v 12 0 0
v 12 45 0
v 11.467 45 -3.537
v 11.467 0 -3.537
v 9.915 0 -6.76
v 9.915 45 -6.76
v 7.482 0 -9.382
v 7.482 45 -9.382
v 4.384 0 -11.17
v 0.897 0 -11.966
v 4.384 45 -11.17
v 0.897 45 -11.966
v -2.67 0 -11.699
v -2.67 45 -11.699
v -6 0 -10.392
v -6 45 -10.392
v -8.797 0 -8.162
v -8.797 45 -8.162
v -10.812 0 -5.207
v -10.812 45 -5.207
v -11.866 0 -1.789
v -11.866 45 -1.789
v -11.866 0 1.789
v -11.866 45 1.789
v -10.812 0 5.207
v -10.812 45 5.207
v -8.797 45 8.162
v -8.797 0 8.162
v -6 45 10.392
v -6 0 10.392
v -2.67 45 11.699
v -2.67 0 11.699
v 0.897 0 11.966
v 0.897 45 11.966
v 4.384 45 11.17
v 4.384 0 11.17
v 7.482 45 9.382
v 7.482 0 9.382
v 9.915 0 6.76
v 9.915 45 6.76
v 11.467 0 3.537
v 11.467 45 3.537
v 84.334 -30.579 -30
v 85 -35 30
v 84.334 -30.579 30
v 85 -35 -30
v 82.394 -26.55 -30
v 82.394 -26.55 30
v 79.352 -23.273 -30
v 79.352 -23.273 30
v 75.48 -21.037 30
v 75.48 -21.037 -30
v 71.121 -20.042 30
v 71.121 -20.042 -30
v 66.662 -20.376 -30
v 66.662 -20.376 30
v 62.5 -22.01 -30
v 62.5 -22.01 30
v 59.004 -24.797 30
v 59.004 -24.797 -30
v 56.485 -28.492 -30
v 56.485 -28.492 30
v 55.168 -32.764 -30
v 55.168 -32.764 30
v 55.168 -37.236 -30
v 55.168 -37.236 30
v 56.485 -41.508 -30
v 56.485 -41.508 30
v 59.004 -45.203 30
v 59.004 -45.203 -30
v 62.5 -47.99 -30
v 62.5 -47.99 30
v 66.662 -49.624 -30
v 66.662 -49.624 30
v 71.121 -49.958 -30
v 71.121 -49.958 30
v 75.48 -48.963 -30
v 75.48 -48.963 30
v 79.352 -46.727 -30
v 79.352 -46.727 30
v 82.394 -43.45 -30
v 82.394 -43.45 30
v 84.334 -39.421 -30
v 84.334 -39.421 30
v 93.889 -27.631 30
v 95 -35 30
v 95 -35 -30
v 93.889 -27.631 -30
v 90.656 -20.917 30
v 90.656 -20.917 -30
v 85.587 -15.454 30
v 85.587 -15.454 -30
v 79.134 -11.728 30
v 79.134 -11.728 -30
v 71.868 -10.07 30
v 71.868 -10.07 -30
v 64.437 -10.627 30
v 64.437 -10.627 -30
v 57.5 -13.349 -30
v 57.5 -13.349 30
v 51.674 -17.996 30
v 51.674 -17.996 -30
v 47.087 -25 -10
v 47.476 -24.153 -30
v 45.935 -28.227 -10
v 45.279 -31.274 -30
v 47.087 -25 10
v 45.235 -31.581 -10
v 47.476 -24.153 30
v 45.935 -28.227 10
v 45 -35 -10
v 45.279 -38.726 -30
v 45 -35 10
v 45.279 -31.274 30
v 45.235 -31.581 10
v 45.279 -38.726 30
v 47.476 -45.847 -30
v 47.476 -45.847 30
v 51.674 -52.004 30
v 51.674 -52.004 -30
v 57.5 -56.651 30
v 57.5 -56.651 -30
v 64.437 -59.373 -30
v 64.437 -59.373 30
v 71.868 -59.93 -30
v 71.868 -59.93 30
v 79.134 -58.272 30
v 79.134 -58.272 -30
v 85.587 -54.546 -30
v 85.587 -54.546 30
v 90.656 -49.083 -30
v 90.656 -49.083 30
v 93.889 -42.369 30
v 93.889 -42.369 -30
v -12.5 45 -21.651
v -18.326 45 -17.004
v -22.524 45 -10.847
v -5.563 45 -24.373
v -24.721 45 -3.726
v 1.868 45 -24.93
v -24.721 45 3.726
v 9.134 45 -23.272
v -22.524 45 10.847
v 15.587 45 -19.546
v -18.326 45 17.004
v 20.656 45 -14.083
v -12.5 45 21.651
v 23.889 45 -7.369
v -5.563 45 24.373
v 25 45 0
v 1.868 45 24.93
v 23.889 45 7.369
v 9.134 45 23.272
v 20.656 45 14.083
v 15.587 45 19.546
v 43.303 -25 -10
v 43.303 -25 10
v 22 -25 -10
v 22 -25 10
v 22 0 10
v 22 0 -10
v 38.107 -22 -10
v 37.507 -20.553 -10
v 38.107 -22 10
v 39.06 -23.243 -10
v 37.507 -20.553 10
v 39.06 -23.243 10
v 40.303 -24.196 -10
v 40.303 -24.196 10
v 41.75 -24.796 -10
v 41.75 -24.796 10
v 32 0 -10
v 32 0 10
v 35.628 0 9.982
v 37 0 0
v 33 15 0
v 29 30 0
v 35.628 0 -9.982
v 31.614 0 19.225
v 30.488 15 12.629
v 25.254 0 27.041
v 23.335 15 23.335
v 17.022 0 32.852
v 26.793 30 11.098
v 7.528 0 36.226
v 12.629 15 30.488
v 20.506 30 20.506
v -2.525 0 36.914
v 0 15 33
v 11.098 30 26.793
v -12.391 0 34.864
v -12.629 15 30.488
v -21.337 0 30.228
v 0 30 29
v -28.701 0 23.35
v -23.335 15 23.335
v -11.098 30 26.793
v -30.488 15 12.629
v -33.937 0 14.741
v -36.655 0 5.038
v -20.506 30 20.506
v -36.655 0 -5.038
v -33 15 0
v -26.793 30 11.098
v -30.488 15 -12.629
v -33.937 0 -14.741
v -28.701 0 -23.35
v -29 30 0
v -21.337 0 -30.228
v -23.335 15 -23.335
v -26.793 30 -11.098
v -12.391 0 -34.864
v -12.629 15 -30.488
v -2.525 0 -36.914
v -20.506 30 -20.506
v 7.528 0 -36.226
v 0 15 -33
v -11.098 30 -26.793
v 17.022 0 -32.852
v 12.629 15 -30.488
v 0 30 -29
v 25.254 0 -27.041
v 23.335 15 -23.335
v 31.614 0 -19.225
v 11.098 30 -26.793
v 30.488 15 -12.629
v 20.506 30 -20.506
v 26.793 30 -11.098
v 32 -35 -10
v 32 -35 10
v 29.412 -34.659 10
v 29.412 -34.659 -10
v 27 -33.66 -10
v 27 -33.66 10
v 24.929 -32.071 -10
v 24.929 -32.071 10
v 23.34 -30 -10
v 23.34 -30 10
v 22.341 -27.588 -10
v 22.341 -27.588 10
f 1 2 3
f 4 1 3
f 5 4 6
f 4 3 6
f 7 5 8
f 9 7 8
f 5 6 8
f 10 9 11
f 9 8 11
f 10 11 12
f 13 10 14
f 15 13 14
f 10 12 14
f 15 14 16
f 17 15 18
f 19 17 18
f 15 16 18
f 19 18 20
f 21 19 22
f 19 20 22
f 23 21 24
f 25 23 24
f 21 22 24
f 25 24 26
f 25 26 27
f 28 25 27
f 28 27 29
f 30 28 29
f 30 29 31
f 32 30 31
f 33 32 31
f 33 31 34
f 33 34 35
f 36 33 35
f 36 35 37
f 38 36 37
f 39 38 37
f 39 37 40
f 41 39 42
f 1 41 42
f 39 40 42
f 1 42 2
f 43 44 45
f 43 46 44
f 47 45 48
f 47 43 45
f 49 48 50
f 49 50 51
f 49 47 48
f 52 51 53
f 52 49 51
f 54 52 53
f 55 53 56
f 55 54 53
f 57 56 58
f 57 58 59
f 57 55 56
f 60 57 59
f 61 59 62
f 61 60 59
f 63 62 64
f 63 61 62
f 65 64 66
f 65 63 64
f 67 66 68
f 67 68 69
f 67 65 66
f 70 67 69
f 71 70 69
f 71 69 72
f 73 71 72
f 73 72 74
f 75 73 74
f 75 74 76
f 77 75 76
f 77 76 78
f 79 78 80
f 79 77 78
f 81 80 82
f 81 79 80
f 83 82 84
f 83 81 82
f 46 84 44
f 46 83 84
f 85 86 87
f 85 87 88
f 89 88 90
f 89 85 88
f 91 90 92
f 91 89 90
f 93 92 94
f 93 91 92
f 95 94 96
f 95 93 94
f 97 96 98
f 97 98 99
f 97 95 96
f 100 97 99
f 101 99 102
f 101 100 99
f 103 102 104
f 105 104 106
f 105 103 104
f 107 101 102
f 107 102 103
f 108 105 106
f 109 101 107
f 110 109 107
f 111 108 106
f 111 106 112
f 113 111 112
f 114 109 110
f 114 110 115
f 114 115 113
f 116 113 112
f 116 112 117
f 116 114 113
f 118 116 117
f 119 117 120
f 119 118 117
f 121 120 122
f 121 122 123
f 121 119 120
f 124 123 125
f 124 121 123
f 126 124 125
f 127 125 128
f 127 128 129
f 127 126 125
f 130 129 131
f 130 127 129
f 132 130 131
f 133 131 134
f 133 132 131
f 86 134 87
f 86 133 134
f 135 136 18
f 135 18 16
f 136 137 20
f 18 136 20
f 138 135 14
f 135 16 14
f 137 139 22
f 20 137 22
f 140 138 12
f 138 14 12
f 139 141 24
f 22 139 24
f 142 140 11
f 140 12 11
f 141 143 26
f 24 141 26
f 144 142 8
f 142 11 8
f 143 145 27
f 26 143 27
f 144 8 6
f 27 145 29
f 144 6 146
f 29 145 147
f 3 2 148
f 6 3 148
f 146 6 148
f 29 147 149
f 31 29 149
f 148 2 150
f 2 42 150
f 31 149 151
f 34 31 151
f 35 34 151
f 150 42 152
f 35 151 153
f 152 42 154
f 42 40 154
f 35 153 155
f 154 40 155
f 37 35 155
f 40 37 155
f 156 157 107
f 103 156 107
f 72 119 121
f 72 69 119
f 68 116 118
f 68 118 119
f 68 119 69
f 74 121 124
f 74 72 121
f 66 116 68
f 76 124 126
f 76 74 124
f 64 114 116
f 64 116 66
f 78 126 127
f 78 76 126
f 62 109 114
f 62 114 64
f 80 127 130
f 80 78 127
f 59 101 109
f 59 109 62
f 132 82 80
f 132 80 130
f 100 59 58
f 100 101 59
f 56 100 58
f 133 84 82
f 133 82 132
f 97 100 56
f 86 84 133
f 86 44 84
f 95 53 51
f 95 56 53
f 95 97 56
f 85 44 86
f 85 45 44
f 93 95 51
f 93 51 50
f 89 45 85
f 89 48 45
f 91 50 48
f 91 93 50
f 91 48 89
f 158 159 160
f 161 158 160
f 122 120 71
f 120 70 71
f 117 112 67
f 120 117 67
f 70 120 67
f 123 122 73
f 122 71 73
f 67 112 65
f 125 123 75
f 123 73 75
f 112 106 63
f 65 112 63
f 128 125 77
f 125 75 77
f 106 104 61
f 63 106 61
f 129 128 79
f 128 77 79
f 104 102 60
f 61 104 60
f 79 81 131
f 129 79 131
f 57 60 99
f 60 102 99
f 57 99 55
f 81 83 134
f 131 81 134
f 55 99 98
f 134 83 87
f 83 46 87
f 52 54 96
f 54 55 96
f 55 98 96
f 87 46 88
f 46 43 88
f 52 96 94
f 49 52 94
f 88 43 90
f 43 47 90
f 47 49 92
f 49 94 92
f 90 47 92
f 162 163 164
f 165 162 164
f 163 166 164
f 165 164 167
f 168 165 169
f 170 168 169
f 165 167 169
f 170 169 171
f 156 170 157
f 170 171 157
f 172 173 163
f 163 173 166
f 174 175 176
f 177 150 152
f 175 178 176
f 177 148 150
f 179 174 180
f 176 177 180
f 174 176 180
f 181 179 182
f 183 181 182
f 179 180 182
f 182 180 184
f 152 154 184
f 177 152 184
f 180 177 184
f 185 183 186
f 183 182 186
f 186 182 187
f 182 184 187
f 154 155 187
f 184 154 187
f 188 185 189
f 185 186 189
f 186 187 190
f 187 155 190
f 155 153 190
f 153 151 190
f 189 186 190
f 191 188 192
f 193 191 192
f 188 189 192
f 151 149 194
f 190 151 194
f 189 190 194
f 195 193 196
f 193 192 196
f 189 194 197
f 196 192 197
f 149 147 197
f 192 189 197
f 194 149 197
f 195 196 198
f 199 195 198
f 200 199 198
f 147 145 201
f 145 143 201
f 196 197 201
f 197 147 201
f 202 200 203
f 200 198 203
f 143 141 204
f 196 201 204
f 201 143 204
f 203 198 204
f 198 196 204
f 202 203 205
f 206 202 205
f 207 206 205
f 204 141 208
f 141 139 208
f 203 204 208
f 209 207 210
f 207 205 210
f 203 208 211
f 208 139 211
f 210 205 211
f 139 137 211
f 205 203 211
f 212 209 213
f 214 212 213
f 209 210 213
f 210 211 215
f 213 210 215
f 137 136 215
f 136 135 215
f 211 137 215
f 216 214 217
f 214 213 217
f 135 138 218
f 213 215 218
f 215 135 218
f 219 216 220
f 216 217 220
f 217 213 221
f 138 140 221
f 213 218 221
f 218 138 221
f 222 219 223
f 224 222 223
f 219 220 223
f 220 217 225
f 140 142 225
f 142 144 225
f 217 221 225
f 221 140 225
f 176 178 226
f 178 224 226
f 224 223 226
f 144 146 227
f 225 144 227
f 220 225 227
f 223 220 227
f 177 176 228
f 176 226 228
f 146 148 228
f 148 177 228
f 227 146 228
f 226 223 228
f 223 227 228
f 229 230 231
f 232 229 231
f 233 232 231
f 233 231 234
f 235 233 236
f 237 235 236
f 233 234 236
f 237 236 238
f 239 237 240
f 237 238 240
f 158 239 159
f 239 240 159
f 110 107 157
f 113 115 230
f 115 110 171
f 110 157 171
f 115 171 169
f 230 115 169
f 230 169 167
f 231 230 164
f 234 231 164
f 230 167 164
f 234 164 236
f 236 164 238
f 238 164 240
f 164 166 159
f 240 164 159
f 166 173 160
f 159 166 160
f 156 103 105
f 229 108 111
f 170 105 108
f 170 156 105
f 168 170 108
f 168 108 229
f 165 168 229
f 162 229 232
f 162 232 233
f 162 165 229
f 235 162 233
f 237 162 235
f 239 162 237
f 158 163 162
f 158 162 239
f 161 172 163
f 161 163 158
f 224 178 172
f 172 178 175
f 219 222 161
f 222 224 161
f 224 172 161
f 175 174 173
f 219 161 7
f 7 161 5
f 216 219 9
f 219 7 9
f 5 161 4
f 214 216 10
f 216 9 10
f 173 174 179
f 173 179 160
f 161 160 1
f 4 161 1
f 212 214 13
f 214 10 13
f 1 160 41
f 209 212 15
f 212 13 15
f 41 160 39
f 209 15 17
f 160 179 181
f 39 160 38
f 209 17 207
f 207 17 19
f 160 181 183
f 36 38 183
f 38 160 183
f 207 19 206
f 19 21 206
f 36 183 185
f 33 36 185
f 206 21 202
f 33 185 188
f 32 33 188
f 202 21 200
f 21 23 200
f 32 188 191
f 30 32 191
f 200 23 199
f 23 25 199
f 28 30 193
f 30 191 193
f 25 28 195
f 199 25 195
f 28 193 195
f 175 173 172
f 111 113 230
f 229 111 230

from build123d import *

# Parameters (mm, degrees)
SKETCH2_R           = 12
CUT_EXTRUDE1_DEPTH  = 45
BOSS_EXTRUDE1_DEPTH = 10
SKETCH4_R           = 25
SKETCH4_R_2         = 15
BOSS_EXTRUDE2_DEPTH = 30


with BuildPart() as part:
    # Sketch1 → Revolve1 (revolve)
    with BuildSketch(Plane.XY):
        Polygon((0, 45), (0, 0), (37, 0), (25, 45), align=None)
    revolve(axis=Axis((0, 45, 0), (0, -1, 0)))

    # Sketch2 → Cut-Extrude1 (cut)
    with BuildSketch(Plane(origin=(0, 45, 0), x_dir=(1, 0, 0), z_dir=(0, 1, 0))):
        Circle(SKETCH2_R)
    extrude(amount=-CUT_EXTRUDE1_DEPTH, mode=Mode.SUBTRACT)

    # Sketch3 → Boss-Extrude1 (add, symmetric)
    with BuildSketch(Plane.XY):
        with BuildLine():
            Line((22, 0), (32, 0))
            Line((32, 0), (37.507136781, -20.552914271))
            ThreePointArc((37.507136781, -20.552914271), (39.650123165, -23.760120042), (43.302691739, -25))
            Line((43.302691739, -25), (50.574709256, -25))
            Line((50.574709256, -25), (50.574709256, -35))
            Line((50.574709256, -35), (32, -35))
            ThreePointArc((32, -35), (24.928932188, -32.071067812), (22, -25))
            Line((22, -25), (22, 0))
        make_face()
    extrude(amount=BOSS_EXTRUDE1_DEPTH, both=True)

    # Sketch4 → Boss-Extrude2 (add, symmetric)
    with BuildSketch(Plane.XY):
        with Locations((70, -35)):
            Circle(SKETCH4_R)
        with Locations((70, -35)):
            Circle(SKETCH4_R_2, mode=Mode.SUBTRACT)
    extrude(amount=BOSS_EXTRUDE2_DEPTH, both=True)


solid = part.part
